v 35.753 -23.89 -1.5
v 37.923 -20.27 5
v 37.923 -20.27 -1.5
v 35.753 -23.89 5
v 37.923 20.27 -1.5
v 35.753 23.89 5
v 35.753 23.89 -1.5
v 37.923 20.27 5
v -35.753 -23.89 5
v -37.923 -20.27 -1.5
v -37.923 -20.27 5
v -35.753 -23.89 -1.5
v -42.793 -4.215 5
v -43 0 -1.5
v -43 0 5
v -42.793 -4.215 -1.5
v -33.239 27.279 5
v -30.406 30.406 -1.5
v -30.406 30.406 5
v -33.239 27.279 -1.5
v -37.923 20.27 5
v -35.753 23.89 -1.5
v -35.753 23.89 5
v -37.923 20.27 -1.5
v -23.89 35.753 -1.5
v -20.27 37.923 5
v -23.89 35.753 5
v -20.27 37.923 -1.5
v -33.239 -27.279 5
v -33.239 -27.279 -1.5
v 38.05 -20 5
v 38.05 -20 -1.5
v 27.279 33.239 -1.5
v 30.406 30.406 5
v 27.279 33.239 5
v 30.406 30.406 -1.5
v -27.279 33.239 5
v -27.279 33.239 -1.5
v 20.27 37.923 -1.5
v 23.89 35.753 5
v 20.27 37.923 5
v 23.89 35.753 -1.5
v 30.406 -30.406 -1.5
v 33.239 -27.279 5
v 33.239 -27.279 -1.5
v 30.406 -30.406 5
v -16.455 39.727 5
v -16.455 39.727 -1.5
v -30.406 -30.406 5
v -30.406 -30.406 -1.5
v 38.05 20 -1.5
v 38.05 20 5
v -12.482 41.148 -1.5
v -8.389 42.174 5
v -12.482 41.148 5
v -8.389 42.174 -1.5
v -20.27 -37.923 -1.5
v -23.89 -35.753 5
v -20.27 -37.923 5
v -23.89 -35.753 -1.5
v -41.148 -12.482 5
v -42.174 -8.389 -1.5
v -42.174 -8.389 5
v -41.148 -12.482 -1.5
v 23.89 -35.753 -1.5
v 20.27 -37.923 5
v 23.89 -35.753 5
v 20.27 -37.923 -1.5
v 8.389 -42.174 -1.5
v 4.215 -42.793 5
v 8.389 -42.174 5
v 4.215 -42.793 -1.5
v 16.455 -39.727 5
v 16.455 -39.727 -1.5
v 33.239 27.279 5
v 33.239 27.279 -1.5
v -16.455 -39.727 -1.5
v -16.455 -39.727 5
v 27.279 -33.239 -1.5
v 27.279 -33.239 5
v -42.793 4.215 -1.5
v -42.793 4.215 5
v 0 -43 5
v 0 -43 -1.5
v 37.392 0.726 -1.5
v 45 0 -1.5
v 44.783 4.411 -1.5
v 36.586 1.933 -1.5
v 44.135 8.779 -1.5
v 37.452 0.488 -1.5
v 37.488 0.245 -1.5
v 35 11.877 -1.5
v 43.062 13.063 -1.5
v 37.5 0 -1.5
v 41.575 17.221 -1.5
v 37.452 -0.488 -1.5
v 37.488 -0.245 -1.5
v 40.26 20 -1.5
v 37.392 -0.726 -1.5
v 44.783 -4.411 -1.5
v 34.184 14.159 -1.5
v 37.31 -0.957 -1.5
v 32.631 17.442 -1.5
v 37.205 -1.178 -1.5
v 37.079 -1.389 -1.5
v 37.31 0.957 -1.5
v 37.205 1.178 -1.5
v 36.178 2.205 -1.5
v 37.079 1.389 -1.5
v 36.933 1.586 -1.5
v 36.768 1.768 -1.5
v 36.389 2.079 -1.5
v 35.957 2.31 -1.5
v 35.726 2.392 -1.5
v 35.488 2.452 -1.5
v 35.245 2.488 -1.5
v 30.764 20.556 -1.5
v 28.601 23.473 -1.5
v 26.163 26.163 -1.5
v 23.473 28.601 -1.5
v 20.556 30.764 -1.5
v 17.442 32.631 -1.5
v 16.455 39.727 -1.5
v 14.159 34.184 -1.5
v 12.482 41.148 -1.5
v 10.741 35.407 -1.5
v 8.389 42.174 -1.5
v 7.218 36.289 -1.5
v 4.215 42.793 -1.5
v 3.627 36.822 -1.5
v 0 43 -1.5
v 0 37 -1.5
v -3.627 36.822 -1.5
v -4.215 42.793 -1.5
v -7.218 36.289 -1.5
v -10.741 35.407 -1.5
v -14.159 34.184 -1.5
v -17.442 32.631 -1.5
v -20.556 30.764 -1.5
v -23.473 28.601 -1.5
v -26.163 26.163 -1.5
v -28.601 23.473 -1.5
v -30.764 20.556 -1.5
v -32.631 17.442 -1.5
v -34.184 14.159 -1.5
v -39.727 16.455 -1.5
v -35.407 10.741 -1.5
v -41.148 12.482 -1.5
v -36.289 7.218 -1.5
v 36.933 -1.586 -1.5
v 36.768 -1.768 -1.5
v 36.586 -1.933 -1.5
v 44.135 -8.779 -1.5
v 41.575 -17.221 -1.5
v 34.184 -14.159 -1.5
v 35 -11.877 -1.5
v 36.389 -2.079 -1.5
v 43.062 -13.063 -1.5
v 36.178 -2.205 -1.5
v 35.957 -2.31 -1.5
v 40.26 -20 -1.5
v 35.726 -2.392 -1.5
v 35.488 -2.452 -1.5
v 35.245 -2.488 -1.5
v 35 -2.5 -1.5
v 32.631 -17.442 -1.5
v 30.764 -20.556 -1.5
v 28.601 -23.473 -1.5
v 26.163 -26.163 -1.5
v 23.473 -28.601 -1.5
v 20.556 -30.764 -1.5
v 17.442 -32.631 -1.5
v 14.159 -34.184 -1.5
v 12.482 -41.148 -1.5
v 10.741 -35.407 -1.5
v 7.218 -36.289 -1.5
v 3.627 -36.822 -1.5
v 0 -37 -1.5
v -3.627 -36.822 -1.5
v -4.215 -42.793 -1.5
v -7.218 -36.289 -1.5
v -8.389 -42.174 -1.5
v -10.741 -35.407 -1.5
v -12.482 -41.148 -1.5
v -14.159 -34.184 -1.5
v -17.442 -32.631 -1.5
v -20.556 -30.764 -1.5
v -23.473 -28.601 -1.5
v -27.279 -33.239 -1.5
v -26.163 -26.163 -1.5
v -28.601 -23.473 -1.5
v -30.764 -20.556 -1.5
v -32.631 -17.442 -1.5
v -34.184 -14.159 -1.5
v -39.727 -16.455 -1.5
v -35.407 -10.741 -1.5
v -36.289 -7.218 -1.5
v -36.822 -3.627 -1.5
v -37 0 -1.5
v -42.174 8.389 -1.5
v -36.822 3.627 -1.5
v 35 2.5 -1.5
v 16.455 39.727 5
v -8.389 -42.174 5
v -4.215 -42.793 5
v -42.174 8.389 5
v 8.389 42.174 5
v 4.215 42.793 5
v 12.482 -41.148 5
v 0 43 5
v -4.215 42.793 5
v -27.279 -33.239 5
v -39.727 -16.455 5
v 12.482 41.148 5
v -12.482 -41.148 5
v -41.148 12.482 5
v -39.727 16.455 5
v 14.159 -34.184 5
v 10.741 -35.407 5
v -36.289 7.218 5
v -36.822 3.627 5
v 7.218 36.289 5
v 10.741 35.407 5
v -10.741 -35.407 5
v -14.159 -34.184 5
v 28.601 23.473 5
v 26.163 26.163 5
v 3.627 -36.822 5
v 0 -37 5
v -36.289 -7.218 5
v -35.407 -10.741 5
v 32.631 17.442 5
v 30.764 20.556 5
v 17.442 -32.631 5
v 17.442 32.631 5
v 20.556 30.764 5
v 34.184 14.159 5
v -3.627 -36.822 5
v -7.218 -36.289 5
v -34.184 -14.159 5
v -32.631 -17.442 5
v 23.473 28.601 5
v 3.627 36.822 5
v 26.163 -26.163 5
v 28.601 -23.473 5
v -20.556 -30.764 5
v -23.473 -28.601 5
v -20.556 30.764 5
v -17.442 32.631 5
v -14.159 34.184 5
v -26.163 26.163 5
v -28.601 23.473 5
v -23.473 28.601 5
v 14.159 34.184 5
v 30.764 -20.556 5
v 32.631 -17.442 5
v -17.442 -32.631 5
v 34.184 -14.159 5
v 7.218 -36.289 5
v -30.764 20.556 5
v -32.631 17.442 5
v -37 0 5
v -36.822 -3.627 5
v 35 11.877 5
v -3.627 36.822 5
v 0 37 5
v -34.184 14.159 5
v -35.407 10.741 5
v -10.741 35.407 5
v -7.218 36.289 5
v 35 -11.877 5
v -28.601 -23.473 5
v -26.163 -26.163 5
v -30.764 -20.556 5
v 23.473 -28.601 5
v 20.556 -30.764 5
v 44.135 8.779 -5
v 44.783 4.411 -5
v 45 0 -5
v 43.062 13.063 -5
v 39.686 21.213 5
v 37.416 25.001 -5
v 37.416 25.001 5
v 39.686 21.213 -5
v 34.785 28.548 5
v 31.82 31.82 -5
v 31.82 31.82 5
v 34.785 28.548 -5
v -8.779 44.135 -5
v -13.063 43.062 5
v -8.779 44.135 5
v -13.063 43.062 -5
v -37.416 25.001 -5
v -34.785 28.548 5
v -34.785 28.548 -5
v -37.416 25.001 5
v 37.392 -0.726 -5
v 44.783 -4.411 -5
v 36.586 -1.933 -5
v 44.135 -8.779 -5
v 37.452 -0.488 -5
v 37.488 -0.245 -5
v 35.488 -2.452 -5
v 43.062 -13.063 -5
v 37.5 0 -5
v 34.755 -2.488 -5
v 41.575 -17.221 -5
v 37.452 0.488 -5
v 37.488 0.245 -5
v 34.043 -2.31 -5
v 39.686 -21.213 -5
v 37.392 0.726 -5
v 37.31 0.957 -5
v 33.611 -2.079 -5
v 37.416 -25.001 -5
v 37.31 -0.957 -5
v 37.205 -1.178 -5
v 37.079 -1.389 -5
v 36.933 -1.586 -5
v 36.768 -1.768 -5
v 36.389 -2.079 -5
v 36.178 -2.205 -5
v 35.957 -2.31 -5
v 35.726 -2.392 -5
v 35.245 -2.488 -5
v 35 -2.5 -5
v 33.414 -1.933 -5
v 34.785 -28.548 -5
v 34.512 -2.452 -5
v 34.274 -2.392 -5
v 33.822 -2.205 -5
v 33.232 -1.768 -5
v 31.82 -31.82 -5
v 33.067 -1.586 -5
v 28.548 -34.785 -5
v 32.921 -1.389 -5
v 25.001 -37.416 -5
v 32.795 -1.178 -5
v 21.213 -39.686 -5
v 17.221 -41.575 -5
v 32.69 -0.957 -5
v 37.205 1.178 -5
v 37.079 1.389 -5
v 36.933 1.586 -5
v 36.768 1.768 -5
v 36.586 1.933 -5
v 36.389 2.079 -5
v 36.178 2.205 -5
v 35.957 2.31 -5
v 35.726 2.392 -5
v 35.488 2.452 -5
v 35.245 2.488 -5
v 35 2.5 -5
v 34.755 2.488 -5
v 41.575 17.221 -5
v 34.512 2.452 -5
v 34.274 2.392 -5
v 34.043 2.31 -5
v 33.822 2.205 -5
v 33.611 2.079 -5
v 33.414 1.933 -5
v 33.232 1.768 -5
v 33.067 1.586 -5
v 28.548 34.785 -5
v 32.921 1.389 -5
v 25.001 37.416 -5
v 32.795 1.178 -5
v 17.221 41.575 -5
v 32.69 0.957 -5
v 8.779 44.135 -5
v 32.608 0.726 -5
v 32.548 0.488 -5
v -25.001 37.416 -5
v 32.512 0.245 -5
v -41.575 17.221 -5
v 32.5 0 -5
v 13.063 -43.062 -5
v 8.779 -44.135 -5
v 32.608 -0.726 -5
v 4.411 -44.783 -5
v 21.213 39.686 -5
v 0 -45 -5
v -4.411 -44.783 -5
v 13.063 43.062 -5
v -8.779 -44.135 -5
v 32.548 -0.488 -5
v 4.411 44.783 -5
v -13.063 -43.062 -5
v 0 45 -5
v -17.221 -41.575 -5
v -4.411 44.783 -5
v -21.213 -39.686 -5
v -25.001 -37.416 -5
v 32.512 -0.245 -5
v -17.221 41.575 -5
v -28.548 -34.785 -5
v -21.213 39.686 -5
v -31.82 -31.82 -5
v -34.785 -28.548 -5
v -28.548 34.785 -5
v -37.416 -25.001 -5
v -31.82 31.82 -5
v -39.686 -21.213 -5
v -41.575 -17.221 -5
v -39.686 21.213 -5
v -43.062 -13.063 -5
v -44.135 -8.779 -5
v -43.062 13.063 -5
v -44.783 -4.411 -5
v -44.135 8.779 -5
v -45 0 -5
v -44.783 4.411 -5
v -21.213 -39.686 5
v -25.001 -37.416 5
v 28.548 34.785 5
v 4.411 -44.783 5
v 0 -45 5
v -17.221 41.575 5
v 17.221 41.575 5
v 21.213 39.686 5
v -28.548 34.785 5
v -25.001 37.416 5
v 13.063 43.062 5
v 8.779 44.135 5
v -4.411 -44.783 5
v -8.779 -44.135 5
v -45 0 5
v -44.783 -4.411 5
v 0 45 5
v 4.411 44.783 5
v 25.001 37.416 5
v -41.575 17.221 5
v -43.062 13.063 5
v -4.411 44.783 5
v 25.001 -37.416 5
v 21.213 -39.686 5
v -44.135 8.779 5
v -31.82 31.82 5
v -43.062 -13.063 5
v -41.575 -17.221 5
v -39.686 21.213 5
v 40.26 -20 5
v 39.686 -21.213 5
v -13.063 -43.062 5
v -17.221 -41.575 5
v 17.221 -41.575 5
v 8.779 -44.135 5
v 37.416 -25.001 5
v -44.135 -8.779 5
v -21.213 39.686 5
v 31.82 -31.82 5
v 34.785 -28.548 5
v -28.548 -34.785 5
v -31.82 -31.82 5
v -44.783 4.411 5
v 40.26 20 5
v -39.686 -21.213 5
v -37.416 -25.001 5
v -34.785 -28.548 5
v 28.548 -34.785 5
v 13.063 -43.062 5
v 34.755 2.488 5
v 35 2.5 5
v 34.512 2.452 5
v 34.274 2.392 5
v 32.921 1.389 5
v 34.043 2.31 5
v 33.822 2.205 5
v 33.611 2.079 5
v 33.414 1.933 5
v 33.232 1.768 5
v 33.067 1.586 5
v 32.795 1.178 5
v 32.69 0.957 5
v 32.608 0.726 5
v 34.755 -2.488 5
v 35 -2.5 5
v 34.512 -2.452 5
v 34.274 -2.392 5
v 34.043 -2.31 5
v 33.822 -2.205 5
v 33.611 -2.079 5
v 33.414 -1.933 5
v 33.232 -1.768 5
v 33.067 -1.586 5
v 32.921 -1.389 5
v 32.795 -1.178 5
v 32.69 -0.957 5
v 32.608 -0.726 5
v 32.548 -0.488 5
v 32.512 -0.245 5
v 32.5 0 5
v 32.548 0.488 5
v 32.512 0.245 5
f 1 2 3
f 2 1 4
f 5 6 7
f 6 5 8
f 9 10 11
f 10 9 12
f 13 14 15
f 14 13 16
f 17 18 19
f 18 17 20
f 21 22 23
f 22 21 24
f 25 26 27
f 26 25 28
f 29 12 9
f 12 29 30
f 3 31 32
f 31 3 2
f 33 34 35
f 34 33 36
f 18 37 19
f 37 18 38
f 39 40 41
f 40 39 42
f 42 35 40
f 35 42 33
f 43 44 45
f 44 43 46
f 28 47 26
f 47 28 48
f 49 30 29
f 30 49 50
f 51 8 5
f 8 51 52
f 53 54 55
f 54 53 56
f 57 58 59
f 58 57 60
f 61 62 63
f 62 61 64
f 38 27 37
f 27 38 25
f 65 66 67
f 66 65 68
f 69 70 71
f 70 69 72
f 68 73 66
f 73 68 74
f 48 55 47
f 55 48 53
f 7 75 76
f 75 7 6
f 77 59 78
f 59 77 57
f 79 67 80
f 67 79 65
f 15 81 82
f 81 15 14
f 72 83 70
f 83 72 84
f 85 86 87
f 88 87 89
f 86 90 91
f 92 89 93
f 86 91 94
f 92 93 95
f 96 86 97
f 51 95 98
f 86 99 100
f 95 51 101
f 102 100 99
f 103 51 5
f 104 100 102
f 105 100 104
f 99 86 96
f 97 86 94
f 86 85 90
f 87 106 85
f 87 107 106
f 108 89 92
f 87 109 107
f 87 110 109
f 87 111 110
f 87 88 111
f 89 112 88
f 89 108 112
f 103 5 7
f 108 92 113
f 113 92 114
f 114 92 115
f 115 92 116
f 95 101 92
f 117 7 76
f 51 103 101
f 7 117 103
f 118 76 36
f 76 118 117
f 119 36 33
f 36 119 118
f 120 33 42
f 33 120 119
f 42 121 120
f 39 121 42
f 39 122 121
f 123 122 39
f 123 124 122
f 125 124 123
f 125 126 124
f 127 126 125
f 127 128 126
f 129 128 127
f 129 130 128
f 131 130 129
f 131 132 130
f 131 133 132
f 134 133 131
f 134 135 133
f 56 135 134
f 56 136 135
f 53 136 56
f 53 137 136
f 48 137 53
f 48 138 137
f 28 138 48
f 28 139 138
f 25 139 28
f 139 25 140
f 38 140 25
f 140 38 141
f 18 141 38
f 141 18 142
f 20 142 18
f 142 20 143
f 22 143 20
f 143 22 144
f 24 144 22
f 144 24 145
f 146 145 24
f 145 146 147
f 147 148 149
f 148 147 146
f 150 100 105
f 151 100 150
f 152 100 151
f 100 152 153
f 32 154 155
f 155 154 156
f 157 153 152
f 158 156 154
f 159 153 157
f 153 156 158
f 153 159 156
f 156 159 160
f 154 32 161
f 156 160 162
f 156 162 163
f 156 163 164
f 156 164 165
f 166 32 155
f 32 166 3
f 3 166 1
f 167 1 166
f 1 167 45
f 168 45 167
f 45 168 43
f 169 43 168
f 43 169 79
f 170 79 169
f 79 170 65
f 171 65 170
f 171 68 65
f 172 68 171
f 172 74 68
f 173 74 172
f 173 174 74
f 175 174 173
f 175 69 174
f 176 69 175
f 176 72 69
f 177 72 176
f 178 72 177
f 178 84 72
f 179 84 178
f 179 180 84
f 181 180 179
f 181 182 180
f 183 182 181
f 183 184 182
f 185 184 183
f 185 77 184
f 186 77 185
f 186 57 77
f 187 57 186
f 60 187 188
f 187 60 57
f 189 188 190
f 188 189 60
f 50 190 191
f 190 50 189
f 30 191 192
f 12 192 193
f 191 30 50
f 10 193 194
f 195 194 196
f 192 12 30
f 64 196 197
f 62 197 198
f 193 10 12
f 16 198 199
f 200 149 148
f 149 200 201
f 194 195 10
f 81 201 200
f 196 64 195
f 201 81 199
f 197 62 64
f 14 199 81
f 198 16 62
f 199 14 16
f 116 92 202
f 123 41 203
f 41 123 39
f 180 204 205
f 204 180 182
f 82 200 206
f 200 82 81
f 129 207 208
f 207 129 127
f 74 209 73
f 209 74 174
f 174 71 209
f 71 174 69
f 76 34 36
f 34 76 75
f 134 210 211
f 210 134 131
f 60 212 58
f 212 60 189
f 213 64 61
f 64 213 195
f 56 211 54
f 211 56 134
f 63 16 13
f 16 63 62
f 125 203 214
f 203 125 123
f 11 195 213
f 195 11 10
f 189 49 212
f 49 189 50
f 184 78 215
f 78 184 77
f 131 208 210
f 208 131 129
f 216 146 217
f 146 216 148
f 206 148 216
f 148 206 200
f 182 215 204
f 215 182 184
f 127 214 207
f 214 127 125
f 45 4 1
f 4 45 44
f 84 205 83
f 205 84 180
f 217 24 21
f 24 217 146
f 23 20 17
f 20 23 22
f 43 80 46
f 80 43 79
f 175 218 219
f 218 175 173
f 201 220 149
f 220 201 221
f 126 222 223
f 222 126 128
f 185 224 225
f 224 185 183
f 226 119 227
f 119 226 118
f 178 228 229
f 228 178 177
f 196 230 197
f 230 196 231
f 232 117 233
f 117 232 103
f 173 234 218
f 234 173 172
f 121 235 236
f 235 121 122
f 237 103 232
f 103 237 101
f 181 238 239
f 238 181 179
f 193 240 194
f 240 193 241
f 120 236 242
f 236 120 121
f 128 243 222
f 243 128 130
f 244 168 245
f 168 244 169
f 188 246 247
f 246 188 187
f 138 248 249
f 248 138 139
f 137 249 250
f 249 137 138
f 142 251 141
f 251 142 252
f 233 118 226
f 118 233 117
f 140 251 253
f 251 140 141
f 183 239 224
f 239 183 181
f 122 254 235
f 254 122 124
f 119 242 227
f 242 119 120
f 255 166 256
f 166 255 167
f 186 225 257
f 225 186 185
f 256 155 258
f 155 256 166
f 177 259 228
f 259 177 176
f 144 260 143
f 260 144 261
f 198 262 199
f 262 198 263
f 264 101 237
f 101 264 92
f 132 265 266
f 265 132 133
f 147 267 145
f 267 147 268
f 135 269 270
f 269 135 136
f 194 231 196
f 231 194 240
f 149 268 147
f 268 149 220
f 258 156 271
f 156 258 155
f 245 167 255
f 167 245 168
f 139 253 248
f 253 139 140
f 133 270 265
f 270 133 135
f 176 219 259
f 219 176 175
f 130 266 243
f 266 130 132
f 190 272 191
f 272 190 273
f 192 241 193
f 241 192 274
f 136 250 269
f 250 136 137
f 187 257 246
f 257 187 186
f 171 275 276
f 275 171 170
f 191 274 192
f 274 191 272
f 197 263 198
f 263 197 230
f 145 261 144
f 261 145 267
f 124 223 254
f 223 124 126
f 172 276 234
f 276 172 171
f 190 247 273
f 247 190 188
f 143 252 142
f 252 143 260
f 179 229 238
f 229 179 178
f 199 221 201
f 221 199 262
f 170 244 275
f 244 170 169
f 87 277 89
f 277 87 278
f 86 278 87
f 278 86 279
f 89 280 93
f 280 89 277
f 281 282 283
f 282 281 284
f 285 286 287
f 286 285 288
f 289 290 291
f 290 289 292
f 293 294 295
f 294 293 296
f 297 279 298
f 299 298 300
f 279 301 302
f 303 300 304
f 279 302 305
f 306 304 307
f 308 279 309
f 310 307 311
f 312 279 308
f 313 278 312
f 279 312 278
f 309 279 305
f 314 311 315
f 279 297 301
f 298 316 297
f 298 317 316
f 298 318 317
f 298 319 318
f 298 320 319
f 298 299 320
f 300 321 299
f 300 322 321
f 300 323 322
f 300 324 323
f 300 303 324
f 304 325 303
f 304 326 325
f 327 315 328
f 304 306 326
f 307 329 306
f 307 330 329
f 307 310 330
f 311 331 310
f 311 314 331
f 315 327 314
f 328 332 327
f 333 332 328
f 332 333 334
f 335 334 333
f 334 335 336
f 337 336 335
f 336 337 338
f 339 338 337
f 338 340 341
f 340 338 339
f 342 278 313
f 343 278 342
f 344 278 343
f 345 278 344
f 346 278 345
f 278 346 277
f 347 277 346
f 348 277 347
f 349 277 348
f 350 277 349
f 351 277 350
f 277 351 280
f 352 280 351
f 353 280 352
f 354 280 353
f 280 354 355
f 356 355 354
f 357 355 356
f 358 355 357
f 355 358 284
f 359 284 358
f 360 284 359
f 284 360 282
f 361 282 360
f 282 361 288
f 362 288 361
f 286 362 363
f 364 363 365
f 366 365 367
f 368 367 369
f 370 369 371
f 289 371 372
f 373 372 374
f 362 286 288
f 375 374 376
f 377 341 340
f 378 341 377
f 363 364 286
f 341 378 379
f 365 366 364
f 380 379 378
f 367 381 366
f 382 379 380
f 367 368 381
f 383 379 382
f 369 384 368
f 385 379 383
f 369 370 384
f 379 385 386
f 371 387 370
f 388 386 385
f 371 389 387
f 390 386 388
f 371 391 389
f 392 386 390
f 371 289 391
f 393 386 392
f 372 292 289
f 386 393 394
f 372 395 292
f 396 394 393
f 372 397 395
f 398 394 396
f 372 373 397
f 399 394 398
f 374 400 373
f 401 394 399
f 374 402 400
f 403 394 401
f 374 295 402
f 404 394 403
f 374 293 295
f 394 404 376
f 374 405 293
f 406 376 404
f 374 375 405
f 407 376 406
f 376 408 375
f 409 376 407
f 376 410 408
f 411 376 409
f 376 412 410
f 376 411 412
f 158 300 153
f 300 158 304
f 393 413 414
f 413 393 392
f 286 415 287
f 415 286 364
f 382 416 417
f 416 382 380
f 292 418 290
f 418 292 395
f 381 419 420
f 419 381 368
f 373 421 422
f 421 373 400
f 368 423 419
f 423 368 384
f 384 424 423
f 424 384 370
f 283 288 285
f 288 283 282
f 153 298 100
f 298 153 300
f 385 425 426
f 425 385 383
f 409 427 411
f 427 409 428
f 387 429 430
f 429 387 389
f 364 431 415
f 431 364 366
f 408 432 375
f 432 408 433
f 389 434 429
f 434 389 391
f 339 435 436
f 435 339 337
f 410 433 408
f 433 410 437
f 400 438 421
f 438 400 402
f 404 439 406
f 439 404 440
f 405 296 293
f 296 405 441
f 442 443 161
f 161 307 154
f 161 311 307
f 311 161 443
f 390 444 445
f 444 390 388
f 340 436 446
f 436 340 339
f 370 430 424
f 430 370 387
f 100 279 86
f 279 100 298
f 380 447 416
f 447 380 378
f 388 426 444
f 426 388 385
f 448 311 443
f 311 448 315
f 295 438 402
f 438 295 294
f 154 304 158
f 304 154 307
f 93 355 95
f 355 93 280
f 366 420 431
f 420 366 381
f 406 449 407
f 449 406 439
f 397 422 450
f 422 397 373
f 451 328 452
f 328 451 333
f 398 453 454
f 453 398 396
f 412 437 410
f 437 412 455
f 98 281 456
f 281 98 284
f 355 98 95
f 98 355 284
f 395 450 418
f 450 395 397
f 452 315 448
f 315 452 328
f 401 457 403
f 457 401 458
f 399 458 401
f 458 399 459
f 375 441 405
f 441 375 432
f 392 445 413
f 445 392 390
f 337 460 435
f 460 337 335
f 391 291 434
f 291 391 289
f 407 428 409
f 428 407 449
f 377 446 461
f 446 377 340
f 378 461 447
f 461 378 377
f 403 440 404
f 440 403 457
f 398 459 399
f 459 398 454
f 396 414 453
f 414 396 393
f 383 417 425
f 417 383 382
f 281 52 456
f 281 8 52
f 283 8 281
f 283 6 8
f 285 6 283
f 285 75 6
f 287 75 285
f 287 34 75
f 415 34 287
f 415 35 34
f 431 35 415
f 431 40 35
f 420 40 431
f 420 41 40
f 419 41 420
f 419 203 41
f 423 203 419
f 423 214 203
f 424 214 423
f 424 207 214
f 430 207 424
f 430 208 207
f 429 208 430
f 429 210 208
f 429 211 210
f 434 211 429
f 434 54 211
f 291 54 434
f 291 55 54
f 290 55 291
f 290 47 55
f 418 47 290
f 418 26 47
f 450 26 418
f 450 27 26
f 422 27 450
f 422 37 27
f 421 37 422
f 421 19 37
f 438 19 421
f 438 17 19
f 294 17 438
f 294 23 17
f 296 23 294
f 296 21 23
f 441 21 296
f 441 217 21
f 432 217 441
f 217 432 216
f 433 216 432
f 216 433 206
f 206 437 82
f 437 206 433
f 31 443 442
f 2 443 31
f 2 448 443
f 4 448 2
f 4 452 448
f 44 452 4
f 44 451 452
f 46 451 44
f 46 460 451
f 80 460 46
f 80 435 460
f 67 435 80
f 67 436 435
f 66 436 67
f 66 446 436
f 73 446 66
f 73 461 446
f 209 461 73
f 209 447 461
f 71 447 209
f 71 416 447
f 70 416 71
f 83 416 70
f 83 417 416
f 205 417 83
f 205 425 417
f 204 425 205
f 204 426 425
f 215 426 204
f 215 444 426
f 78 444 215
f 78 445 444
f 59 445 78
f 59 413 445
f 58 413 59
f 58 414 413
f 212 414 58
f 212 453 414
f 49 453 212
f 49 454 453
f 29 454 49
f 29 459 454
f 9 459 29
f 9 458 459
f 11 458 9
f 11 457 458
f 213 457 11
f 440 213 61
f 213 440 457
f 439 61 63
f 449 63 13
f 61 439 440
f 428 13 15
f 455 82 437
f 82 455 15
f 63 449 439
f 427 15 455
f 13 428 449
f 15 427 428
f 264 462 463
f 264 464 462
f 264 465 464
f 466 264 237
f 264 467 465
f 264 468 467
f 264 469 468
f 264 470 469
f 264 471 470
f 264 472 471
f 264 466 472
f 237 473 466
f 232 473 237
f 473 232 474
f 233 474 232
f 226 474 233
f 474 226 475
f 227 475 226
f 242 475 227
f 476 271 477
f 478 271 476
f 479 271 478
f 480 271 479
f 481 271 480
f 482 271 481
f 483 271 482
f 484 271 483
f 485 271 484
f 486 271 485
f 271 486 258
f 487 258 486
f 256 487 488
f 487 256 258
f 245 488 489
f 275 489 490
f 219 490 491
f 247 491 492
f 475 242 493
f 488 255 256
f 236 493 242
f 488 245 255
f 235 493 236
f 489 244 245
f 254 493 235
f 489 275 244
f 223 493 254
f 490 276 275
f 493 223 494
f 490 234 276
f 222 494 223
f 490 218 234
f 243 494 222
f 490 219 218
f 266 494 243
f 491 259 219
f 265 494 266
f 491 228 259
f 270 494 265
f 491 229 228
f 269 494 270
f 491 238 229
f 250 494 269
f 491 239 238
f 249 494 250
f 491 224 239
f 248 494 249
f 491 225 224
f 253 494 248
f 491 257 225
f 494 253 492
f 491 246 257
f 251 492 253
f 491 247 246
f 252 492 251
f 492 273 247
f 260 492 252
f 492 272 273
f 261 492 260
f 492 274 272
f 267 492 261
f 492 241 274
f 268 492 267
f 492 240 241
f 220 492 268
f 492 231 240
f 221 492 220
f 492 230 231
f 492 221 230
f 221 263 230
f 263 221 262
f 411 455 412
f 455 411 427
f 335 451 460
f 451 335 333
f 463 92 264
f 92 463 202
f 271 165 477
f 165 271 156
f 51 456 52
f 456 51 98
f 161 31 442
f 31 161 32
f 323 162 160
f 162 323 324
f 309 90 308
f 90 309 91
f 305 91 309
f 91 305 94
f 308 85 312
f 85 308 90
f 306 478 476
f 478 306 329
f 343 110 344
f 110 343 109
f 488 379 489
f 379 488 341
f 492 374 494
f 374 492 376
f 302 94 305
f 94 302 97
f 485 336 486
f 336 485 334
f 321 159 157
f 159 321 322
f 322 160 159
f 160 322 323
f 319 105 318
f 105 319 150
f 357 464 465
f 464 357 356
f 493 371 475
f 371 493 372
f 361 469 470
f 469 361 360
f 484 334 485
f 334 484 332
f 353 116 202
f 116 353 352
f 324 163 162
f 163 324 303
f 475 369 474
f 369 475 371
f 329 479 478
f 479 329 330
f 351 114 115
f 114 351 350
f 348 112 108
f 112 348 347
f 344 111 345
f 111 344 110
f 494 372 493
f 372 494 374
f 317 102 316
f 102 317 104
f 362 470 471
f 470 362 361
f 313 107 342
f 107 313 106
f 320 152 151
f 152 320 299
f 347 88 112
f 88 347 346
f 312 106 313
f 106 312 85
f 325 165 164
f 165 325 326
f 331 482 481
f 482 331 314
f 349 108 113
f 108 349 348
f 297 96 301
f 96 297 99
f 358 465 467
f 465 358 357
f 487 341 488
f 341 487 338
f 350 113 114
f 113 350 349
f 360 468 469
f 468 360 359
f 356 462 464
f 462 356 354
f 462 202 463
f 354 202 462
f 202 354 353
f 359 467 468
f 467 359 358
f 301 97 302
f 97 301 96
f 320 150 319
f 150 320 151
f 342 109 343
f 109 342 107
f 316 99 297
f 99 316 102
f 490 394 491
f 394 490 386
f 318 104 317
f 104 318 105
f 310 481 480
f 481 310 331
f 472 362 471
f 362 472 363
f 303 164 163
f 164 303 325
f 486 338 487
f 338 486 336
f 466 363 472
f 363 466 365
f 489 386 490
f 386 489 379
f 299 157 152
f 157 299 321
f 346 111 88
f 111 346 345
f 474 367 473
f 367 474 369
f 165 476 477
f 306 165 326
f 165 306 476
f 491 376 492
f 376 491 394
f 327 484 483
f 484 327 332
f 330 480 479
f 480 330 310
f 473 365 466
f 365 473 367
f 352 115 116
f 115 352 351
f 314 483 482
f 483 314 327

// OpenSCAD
// file: nut_banana.scad
//nut();

module nut(){
    color("pink")
    difference(){
        cylinder(d=12, h=2, center=true, $fn=6);
        cylinder(d=5.5, h=3, center=true, $fn=54);
    }
}
// file: banana.scad
include <nut_banana.scad>


$fn = 64;
diam_hole = 5.4 + 0.5;

//banana();

//translate([0, 0, -25/2-0.5])
//banana();
//
//translate([0,20/2,-5])
//rotate([0,0,90])
//nut();
//
//translate([0,-20/2,-5])
//rotate([0,0,90])
//nut();
//color("red")
//translate([-3, 0, 0])
//cube([20,40-6,25-6], center = true);

module banana() {
    difference() {
        base();
        holes_banana();
    }
}

module base() {
    cube([20, 40, 25], center = true);
}


module holes_banana() {
    translate([0, 20/2, 0])
    cylinder(d=diam_hole, h = 50, center = true);

    translate([0, -20/2, 0])
    cylinder(d=diam_hole, h = 50, center = true);
    
    translate([-3, 0, -3])
    cube([20,40-6,25], center = true);
}
// file: speaker_bottom.scad
include <speaker_walls.scad>;
$fn = 640;

//bottom_kit();

module bottom_kit() {
    difference() {
        bottom();
        holes();
    }
}

module holes() {
    translate([90/2, 0, 25/2-1.5])
    cube([20, 40, 25], center=true);
    translate([90/2-20/2, 0, 0])
    cylinder(d=5, h=30, center=true);
}

module bottom() {
    difference() {
        cylinder(d = 90, h = 10, center = true);
        translate([0, 0, 150/2+10/4-4])
        walls(thickness = 12);
    }
}
// file: speaker_walls.scad
// Bluetooth speaker
$fn = 640;

//walls(thickness=14);

module walls(thickness) {
    difference() {
        cylinder(d = 80 + thickness/2, h = 150, center = true);
        color("red")
        cylinder(d = 80-thickness/2, h = 160, center = true);
    }
}
// main file
include <speaker_walls.scad>
include <speaker_bottom.scad>
include <banana.scad>

bottom_kit();

//translate([90/2 + 20/2, 0, 0])
//banana();
//translate([0, 0, 150/2+10/4-4])
//walls(thickness = 5); 
//
//difference(){
//    bottom_kit();
//    translate([-90/2, 0, 0])
//    cube(90, center = true);
//}
